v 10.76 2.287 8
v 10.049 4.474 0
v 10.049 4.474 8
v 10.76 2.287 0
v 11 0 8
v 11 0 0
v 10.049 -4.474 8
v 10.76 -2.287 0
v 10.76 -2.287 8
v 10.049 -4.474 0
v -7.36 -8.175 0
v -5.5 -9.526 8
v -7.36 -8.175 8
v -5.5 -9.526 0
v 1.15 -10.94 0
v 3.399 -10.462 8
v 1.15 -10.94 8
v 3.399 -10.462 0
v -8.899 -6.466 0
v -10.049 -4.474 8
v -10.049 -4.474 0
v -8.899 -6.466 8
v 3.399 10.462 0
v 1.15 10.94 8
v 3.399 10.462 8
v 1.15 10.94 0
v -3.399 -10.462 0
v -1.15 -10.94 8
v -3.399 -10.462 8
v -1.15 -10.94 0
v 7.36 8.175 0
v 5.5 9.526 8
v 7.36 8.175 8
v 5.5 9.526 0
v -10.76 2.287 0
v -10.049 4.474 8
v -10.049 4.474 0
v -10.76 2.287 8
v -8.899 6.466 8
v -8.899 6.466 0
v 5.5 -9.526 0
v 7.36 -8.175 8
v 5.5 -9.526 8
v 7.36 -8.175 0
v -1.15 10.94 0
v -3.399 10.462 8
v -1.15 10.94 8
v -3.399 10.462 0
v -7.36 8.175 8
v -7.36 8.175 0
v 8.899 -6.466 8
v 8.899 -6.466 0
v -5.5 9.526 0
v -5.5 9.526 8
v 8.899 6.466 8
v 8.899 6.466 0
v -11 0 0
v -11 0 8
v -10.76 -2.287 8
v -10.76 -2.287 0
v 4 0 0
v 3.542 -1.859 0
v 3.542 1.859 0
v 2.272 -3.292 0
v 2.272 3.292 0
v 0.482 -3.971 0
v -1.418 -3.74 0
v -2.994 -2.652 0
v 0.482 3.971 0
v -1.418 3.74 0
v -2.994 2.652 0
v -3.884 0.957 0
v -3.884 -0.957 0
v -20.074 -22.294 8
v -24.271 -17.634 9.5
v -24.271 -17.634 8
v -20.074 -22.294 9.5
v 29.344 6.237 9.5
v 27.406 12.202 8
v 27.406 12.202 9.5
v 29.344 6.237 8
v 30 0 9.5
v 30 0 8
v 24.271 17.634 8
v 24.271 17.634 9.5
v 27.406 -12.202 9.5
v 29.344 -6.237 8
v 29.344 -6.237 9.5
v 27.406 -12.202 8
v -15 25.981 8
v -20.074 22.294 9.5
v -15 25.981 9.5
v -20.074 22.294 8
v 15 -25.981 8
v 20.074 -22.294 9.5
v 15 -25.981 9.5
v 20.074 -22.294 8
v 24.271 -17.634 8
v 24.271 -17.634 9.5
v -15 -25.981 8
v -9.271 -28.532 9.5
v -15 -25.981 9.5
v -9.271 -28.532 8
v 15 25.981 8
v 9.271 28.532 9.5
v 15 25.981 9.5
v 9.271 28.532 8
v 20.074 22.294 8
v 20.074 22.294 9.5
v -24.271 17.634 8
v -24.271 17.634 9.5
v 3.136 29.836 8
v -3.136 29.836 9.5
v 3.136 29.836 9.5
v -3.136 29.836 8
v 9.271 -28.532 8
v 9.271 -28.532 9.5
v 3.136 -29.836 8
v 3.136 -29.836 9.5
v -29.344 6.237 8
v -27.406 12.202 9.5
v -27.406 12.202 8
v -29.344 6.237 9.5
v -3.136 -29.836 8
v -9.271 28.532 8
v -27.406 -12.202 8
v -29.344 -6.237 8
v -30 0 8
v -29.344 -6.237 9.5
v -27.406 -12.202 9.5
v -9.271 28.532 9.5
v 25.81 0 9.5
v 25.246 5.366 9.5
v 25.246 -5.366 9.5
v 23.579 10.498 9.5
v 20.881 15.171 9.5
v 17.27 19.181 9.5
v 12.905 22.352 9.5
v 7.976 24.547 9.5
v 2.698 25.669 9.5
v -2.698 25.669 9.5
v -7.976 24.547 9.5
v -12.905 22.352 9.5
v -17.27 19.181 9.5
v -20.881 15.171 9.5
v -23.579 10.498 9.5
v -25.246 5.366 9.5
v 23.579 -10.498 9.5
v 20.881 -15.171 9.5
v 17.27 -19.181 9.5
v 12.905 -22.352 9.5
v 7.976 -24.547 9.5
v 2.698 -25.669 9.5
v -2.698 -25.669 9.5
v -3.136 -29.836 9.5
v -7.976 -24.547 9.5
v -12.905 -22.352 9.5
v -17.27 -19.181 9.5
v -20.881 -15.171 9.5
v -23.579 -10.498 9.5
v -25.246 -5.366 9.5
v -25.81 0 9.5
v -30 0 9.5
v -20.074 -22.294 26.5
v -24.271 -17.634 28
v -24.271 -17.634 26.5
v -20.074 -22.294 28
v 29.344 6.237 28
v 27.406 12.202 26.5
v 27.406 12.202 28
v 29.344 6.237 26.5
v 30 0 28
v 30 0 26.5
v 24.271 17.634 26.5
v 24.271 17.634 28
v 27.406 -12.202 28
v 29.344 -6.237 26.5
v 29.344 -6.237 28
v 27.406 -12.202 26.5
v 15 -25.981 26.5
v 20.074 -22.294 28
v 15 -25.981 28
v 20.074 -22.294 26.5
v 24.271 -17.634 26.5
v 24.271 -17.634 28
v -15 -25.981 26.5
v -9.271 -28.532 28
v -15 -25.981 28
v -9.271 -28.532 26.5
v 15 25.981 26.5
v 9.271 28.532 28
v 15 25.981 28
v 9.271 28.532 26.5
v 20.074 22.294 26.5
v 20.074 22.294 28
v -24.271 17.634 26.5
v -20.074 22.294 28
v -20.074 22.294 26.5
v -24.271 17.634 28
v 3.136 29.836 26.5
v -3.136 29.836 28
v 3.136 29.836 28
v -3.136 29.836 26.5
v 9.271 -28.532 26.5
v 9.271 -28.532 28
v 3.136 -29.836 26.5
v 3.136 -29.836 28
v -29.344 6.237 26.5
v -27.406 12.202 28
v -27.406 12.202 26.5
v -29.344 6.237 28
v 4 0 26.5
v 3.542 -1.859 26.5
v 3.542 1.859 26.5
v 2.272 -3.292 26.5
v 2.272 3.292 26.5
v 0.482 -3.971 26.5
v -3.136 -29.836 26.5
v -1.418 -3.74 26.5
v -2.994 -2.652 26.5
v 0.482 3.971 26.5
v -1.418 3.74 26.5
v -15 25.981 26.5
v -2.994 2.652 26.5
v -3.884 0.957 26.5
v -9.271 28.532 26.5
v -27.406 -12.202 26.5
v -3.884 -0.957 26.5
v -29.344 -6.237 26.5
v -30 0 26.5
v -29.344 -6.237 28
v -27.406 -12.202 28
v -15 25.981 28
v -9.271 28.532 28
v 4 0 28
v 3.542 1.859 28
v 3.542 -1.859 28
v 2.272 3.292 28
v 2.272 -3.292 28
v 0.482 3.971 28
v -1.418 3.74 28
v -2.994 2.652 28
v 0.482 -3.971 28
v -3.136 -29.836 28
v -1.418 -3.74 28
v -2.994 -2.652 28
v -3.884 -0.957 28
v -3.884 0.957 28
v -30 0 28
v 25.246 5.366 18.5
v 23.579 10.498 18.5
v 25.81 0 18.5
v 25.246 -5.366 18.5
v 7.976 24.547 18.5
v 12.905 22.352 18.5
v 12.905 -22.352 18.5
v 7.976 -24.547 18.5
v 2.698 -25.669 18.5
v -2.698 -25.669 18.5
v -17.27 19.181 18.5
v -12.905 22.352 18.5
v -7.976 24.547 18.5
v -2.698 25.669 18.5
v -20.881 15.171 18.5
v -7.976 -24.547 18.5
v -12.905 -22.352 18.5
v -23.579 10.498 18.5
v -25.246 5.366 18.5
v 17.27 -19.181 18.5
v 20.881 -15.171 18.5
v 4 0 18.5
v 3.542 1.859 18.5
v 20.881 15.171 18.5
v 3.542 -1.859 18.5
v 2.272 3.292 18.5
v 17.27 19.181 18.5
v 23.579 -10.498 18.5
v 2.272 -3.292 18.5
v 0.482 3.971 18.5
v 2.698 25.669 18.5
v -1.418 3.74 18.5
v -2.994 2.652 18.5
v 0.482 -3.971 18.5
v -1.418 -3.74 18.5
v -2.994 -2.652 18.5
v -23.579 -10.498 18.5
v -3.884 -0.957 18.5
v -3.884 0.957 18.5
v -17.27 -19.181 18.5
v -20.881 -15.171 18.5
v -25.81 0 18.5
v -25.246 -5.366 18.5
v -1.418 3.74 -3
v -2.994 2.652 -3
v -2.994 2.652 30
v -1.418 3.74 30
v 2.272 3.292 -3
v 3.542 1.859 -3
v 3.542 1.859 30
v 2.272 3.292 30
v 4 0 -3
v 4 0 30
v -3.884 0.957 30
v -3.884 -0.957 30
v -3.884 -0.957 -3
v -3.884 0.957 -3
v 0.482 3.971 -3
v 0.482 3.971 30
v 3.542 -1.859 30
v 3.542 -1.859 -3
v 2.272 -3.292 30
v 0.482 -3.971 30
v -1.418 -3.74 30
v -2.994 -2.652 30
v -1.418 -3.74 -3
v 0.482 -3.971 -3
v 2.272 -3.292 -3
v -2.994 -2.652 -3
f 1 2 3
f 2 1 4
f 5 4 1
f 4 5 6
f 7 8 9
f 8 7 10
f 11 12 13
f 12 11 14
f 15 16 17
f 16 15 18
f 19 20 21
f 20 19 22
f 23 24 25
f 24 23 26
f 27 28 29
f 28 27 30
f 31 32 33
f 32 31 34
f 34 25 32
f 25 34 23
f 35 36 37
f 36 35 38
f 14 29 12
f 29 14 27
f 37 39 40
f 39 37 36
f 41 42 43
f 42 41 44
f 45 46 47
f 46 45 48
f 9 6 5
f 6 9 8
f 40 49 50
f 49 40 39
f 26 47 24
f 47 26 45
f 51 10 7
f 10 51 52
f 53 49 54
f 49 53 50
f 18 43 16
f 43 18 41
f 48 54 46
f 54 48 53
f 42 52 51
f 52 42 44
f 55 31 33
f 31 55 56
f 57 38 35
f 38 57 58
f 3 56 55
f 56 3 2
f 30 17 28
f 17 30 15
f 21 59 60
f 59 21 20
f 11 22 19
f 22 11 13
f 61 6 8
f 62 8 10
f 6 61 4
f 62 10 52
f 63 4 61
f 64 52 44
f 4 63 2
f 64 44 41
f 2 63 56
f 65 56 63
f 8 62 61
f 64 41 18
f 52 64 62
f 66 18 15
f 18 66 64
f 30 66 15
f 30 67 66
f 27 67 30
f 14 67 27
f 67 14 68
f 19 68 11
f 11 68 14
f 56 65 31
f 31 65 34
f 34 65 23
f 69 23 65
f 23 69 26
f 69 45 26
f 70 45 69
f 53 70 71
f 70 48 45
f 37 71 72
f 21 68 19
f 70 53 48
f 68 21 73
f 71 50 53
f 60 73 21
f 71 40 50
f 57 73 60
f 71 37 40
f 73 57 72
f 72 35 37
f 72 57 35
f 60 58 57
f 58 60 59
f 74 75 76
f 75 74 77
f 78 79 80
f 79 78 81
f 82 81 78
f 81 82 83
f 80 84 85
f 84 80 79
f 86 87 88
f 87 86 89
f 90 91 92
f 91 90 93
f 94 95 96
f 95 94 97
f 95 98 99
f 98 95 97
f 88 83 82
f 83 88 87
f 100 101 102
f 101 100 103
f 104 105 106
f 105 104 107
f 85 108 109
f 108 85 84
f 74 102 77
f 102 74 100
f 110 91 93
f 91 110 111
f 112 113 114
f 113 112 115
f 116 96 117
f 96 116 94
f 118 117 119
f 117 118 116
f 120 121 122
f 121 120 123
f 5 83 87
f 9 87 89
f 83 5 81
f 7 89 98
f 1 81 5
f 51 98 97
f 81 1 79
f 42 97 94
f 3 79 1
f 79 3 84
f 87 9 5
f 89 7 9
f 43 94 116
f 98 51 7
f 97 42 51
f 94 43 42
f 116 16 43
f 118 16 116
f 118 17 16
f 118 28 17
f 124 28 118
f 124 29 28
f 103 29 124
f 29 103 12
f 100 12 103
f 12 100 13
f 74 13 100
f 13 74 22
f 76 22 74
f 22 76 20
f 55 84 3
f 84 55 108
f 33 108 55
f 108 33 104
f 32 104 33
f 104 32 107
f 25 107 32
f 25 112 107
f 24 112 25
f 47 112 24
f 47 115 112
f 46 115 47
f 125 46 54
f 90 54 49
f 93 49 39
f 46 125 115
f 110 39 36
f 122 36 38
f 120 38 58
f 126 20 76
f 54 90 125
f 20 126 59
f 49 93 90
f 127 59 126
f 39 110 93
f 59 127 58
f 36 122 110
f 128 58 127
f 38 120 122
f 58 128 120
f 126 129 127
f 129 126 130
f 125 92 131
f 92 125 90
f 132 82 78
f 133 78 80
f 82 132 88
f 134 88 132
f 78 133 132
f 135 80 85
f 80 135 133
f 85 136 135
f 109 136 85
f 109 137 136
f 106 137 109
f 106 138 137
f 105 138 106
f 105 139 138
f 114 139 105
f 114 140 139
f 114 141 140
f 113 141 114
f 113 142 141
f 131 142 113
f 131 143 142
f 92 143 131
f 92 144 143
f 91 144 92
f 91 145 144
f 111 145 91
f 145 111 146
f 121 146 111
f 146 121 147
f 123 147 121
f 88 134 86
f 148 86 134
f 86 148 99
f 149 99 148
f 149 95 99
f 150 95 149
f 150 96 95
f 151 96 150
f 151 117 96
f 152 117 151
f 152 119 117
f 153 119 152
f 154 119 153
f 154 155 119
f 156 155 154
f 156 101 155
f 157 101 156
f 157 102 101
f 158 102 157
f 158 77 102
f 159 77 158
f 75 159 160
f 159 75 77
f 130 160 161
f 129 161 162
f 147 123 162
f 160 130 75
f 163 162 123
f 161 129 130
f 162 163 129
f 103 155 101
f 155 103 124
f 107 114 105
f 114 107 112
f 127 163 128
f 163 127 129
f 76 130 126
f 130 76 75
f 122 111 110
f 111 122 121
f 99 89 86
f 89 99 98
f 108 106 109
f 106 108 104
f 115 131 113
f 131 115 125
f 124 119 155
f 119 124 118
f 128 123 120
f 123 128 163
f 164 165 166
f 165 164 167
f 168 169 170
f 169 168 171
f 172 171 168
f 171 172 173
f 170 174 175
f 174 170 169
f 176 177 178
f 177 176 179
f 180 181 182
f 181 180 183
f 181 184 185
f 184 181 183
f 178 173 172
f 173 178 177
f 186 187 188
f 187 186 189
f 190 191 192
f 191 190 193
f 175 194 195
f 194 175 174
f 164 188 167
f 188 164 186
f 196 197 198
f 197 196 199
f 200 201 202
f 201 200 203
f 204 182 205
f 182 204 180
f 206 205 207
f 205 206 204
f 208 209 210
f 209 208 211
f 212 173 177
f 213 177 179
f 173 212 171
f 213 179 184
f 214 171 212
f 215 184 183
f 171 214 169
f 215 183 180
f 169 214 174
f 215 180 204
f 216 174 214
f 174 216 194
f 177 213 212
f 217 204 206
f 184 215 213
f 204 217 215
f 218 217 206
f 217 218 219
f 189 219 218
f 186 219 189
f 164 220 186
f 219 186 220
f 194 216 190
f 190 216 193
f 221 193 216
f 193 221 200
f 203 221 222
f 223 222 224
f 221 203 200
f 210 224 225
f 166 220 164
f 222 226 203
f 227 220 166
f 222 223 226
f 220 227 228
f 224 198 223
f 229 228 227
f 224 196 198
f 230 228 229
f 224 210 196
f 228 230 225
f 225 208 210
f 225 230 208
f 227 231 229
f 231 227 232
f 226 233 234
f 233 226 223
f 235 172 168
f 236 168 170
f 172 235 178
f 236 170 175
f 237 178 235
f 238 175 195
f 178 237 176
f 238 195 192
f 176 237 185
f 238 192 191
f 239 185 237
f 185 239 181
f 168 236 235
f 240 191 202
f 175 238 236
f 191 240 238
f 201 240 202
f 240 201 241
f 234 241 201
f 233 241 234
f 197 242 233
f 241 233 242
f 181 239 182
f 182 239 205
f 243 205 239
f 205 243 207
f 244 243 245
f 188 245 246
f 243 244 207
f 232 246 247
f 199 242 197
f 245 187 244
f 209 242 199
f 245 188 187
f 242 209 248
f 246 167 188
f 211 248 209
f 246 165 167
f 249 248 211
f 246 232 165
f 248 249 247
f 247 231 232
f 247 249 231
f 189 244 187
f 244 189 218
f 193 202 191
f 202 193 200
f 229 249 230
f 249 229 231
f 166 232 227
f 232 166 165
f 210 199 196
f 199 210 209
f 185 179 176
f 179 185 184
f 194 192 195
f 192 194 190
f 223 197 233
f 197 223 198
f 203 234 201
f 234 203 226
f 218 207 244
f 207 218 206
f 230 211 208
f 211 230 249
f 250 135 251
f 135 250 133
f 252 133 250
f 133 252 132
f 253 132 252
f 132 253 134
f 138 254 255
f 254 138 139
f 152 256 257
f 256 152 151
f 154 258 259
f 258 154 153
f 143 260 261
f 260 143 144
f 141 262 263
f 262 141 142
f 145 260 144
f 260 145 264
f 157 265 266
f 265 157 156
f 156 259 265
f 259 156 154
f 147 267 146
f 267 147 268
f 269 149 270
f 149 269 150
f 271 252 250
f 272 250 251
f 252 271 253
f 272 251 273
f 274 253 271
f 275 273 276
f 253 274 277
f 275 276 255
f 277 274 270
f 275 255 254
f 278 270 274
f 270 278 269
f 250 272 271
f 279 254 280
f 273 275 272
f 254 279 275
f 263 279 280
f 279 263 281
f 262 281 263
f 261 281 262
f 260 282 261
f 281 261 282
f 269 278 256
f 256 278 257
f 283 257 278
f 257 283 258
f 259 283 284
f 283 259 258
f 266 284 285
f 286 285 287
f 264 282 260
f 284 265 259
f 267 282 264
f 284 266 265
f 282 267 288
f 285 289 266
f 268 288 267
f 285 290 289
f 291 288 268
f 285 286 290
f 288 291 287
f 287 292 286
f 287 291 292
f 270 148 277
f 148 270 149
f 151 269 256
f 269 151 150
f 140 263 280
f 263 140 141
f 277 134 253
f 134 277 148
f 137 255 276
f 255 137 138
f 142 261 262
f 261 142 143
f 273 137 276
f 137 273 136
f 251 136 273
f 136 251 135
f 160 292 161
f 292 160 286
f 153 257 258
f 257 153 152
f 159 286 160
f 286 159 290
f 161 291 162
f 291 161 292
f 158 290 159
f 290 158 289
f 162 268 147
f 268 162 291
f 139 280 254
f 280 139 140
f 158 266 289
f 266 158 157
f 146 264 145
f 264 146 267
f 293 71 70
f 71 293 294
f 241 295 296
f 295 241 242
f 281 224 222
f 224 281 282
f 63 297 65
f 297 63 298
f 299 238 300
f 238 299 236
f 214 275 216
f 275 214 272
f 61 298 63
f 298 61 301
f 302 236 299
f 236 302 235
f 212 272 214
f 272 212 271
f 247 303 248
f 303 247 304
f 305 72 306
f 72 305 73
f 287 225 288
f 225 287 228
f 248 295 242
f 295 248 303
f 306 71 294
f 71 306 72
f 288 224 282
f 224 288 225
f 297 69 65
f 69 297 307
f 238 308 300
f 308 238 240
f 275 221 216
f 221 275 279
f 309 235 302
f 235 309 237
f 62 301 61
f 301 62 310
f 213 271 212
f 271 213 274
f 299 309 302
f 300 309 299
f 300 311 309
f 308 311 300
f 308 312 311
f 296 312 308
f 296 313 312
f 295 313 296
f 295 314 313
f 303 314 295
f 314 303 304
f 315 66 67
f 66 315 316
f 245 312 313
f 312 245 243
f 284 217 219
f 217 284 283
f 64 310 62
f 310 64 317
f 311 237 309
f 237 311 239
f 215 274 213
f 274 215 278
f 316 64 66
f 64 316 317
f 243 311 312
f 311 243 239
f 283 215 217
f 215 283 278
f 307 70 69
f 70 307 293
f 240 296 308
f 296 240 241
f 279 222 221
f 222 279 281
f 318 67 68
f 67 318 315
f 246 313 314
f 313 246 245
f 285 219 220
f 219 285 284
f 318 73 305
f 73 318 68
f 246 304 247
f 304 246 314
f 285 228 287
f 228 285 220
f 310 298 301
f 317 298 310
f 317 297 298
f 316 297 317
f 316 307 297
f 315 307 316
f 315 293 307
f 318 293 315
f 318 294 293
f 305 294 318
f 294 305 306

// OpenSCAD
// Parameters
tooth_count = 80; //[40:160:1]
pitch_diameter_mm = 50.42; //[25.21:100.84:0.01]
belt_pitch_mm = 2; //[1:10:0.01]
pulley_width_mm = 10; //[5:30:0.1]
bore_diameter_mm = 8; //[3:20:0.01]
hub_diameter_mm = 22; //[12:44:0.1]
hub_length_mm = 16; //[8:32:0.1]
flange_diameter_mm = 60; //[40:90:0.1]
flange_thickness_mm = 1.5; //[0.8:4:0.1]
set_screw_count = 2; //[0:4:1]
set_screw_hole_diameter_mm = 3.3; //[2:6:0.01]
set_screw_z_mm = 8; //[2:30:0.1]
tooth_radial_height_mm = 1.2; //[0.6:2.5:0.01]
tooth_tangential_width_mm = 1.2; //[0.6:3:0.01]
tooth_root_clearance_mm = 0.6; //[0.2:1.5:0.01]
connection_overlap_mm = 1; //[0.5:2:0.1]

// Pulley - complete geometry
module pulley() {
  color("Silver") {
    // Hub
    translate([0, 0, hub_length_mm/2])
      cylinder(r=hub_diameter_mm/2, h=hub_length_mm, center=true);

    // Flanges
    translate([0, 0, (hub_length_mm + flange_thickness_mm)/2])
      cylinder(r=flange_diameter_mm/2, h=flange_thickness_mm, center=true);
    translate([0, 0, (hub_length_mm + 2*flange_thickness_mm + pulley_width_mm - flange_thickness_mm/2 - connection_overlap_mm)])
      cylinder(r=flange_diameter_mm/2, h=flange_thickness_mm, center=true);

    // Pulley Body
    translate([0, 0, (hub_length_mm/2 + flange_thickness_mm + pulley_width_mm/2 - connection_overlap_mm)])
      cylinder(r=(pitch_diameter_mm/2 + tooth_radial_height_mm - tooth_root_clearance_mm), h=pulley_width_mm, center=true);

    // Bore
    translate([0, 0, (hub_length_mm/2 + flange_thickness_mm + pulley_width_mm/2 - connection_overlap_mm)])
      cylinder(r=bore_diameter_mm/2, h=(hub_length_mm + 2*flange_thickness_mm + pulley_width_mm + 4*connection_overlap_mm), center=true);
  }
}

// Printed Pulley GT2 Teeth
module printed_pulley_GT2_teeth() {
  for (i = [0:tooth_count-1]) {
    rotate([0, 0, i*360/tooth_count]) {
      translate([0, (pitch_diameter_mm/2 + tooth_radial_height_mm/2 - connection_overlap_mm), (hub_length_mm/2 + flange_thickness_mm + pulley_width_mm/2 - connection_overlap_mm)])
        cube([tooth_tangential_width_mm, tooth_radial_height_mm, pulley_width_mm], center=true);
    }
  }
}

// Printed Pulley Teeth From Profile
module printed_pulley_teeth_from_profile() {
  printed_pulley_GT2_teeth();
}

// Printed Pulley Teeth
module printed_pulley_teeth() {
  printed_pulley_teeth_from_profile();
}

// Assembly
module assembly() {
  pulley();
  printed_pulley_teeth();
}

assembly();
